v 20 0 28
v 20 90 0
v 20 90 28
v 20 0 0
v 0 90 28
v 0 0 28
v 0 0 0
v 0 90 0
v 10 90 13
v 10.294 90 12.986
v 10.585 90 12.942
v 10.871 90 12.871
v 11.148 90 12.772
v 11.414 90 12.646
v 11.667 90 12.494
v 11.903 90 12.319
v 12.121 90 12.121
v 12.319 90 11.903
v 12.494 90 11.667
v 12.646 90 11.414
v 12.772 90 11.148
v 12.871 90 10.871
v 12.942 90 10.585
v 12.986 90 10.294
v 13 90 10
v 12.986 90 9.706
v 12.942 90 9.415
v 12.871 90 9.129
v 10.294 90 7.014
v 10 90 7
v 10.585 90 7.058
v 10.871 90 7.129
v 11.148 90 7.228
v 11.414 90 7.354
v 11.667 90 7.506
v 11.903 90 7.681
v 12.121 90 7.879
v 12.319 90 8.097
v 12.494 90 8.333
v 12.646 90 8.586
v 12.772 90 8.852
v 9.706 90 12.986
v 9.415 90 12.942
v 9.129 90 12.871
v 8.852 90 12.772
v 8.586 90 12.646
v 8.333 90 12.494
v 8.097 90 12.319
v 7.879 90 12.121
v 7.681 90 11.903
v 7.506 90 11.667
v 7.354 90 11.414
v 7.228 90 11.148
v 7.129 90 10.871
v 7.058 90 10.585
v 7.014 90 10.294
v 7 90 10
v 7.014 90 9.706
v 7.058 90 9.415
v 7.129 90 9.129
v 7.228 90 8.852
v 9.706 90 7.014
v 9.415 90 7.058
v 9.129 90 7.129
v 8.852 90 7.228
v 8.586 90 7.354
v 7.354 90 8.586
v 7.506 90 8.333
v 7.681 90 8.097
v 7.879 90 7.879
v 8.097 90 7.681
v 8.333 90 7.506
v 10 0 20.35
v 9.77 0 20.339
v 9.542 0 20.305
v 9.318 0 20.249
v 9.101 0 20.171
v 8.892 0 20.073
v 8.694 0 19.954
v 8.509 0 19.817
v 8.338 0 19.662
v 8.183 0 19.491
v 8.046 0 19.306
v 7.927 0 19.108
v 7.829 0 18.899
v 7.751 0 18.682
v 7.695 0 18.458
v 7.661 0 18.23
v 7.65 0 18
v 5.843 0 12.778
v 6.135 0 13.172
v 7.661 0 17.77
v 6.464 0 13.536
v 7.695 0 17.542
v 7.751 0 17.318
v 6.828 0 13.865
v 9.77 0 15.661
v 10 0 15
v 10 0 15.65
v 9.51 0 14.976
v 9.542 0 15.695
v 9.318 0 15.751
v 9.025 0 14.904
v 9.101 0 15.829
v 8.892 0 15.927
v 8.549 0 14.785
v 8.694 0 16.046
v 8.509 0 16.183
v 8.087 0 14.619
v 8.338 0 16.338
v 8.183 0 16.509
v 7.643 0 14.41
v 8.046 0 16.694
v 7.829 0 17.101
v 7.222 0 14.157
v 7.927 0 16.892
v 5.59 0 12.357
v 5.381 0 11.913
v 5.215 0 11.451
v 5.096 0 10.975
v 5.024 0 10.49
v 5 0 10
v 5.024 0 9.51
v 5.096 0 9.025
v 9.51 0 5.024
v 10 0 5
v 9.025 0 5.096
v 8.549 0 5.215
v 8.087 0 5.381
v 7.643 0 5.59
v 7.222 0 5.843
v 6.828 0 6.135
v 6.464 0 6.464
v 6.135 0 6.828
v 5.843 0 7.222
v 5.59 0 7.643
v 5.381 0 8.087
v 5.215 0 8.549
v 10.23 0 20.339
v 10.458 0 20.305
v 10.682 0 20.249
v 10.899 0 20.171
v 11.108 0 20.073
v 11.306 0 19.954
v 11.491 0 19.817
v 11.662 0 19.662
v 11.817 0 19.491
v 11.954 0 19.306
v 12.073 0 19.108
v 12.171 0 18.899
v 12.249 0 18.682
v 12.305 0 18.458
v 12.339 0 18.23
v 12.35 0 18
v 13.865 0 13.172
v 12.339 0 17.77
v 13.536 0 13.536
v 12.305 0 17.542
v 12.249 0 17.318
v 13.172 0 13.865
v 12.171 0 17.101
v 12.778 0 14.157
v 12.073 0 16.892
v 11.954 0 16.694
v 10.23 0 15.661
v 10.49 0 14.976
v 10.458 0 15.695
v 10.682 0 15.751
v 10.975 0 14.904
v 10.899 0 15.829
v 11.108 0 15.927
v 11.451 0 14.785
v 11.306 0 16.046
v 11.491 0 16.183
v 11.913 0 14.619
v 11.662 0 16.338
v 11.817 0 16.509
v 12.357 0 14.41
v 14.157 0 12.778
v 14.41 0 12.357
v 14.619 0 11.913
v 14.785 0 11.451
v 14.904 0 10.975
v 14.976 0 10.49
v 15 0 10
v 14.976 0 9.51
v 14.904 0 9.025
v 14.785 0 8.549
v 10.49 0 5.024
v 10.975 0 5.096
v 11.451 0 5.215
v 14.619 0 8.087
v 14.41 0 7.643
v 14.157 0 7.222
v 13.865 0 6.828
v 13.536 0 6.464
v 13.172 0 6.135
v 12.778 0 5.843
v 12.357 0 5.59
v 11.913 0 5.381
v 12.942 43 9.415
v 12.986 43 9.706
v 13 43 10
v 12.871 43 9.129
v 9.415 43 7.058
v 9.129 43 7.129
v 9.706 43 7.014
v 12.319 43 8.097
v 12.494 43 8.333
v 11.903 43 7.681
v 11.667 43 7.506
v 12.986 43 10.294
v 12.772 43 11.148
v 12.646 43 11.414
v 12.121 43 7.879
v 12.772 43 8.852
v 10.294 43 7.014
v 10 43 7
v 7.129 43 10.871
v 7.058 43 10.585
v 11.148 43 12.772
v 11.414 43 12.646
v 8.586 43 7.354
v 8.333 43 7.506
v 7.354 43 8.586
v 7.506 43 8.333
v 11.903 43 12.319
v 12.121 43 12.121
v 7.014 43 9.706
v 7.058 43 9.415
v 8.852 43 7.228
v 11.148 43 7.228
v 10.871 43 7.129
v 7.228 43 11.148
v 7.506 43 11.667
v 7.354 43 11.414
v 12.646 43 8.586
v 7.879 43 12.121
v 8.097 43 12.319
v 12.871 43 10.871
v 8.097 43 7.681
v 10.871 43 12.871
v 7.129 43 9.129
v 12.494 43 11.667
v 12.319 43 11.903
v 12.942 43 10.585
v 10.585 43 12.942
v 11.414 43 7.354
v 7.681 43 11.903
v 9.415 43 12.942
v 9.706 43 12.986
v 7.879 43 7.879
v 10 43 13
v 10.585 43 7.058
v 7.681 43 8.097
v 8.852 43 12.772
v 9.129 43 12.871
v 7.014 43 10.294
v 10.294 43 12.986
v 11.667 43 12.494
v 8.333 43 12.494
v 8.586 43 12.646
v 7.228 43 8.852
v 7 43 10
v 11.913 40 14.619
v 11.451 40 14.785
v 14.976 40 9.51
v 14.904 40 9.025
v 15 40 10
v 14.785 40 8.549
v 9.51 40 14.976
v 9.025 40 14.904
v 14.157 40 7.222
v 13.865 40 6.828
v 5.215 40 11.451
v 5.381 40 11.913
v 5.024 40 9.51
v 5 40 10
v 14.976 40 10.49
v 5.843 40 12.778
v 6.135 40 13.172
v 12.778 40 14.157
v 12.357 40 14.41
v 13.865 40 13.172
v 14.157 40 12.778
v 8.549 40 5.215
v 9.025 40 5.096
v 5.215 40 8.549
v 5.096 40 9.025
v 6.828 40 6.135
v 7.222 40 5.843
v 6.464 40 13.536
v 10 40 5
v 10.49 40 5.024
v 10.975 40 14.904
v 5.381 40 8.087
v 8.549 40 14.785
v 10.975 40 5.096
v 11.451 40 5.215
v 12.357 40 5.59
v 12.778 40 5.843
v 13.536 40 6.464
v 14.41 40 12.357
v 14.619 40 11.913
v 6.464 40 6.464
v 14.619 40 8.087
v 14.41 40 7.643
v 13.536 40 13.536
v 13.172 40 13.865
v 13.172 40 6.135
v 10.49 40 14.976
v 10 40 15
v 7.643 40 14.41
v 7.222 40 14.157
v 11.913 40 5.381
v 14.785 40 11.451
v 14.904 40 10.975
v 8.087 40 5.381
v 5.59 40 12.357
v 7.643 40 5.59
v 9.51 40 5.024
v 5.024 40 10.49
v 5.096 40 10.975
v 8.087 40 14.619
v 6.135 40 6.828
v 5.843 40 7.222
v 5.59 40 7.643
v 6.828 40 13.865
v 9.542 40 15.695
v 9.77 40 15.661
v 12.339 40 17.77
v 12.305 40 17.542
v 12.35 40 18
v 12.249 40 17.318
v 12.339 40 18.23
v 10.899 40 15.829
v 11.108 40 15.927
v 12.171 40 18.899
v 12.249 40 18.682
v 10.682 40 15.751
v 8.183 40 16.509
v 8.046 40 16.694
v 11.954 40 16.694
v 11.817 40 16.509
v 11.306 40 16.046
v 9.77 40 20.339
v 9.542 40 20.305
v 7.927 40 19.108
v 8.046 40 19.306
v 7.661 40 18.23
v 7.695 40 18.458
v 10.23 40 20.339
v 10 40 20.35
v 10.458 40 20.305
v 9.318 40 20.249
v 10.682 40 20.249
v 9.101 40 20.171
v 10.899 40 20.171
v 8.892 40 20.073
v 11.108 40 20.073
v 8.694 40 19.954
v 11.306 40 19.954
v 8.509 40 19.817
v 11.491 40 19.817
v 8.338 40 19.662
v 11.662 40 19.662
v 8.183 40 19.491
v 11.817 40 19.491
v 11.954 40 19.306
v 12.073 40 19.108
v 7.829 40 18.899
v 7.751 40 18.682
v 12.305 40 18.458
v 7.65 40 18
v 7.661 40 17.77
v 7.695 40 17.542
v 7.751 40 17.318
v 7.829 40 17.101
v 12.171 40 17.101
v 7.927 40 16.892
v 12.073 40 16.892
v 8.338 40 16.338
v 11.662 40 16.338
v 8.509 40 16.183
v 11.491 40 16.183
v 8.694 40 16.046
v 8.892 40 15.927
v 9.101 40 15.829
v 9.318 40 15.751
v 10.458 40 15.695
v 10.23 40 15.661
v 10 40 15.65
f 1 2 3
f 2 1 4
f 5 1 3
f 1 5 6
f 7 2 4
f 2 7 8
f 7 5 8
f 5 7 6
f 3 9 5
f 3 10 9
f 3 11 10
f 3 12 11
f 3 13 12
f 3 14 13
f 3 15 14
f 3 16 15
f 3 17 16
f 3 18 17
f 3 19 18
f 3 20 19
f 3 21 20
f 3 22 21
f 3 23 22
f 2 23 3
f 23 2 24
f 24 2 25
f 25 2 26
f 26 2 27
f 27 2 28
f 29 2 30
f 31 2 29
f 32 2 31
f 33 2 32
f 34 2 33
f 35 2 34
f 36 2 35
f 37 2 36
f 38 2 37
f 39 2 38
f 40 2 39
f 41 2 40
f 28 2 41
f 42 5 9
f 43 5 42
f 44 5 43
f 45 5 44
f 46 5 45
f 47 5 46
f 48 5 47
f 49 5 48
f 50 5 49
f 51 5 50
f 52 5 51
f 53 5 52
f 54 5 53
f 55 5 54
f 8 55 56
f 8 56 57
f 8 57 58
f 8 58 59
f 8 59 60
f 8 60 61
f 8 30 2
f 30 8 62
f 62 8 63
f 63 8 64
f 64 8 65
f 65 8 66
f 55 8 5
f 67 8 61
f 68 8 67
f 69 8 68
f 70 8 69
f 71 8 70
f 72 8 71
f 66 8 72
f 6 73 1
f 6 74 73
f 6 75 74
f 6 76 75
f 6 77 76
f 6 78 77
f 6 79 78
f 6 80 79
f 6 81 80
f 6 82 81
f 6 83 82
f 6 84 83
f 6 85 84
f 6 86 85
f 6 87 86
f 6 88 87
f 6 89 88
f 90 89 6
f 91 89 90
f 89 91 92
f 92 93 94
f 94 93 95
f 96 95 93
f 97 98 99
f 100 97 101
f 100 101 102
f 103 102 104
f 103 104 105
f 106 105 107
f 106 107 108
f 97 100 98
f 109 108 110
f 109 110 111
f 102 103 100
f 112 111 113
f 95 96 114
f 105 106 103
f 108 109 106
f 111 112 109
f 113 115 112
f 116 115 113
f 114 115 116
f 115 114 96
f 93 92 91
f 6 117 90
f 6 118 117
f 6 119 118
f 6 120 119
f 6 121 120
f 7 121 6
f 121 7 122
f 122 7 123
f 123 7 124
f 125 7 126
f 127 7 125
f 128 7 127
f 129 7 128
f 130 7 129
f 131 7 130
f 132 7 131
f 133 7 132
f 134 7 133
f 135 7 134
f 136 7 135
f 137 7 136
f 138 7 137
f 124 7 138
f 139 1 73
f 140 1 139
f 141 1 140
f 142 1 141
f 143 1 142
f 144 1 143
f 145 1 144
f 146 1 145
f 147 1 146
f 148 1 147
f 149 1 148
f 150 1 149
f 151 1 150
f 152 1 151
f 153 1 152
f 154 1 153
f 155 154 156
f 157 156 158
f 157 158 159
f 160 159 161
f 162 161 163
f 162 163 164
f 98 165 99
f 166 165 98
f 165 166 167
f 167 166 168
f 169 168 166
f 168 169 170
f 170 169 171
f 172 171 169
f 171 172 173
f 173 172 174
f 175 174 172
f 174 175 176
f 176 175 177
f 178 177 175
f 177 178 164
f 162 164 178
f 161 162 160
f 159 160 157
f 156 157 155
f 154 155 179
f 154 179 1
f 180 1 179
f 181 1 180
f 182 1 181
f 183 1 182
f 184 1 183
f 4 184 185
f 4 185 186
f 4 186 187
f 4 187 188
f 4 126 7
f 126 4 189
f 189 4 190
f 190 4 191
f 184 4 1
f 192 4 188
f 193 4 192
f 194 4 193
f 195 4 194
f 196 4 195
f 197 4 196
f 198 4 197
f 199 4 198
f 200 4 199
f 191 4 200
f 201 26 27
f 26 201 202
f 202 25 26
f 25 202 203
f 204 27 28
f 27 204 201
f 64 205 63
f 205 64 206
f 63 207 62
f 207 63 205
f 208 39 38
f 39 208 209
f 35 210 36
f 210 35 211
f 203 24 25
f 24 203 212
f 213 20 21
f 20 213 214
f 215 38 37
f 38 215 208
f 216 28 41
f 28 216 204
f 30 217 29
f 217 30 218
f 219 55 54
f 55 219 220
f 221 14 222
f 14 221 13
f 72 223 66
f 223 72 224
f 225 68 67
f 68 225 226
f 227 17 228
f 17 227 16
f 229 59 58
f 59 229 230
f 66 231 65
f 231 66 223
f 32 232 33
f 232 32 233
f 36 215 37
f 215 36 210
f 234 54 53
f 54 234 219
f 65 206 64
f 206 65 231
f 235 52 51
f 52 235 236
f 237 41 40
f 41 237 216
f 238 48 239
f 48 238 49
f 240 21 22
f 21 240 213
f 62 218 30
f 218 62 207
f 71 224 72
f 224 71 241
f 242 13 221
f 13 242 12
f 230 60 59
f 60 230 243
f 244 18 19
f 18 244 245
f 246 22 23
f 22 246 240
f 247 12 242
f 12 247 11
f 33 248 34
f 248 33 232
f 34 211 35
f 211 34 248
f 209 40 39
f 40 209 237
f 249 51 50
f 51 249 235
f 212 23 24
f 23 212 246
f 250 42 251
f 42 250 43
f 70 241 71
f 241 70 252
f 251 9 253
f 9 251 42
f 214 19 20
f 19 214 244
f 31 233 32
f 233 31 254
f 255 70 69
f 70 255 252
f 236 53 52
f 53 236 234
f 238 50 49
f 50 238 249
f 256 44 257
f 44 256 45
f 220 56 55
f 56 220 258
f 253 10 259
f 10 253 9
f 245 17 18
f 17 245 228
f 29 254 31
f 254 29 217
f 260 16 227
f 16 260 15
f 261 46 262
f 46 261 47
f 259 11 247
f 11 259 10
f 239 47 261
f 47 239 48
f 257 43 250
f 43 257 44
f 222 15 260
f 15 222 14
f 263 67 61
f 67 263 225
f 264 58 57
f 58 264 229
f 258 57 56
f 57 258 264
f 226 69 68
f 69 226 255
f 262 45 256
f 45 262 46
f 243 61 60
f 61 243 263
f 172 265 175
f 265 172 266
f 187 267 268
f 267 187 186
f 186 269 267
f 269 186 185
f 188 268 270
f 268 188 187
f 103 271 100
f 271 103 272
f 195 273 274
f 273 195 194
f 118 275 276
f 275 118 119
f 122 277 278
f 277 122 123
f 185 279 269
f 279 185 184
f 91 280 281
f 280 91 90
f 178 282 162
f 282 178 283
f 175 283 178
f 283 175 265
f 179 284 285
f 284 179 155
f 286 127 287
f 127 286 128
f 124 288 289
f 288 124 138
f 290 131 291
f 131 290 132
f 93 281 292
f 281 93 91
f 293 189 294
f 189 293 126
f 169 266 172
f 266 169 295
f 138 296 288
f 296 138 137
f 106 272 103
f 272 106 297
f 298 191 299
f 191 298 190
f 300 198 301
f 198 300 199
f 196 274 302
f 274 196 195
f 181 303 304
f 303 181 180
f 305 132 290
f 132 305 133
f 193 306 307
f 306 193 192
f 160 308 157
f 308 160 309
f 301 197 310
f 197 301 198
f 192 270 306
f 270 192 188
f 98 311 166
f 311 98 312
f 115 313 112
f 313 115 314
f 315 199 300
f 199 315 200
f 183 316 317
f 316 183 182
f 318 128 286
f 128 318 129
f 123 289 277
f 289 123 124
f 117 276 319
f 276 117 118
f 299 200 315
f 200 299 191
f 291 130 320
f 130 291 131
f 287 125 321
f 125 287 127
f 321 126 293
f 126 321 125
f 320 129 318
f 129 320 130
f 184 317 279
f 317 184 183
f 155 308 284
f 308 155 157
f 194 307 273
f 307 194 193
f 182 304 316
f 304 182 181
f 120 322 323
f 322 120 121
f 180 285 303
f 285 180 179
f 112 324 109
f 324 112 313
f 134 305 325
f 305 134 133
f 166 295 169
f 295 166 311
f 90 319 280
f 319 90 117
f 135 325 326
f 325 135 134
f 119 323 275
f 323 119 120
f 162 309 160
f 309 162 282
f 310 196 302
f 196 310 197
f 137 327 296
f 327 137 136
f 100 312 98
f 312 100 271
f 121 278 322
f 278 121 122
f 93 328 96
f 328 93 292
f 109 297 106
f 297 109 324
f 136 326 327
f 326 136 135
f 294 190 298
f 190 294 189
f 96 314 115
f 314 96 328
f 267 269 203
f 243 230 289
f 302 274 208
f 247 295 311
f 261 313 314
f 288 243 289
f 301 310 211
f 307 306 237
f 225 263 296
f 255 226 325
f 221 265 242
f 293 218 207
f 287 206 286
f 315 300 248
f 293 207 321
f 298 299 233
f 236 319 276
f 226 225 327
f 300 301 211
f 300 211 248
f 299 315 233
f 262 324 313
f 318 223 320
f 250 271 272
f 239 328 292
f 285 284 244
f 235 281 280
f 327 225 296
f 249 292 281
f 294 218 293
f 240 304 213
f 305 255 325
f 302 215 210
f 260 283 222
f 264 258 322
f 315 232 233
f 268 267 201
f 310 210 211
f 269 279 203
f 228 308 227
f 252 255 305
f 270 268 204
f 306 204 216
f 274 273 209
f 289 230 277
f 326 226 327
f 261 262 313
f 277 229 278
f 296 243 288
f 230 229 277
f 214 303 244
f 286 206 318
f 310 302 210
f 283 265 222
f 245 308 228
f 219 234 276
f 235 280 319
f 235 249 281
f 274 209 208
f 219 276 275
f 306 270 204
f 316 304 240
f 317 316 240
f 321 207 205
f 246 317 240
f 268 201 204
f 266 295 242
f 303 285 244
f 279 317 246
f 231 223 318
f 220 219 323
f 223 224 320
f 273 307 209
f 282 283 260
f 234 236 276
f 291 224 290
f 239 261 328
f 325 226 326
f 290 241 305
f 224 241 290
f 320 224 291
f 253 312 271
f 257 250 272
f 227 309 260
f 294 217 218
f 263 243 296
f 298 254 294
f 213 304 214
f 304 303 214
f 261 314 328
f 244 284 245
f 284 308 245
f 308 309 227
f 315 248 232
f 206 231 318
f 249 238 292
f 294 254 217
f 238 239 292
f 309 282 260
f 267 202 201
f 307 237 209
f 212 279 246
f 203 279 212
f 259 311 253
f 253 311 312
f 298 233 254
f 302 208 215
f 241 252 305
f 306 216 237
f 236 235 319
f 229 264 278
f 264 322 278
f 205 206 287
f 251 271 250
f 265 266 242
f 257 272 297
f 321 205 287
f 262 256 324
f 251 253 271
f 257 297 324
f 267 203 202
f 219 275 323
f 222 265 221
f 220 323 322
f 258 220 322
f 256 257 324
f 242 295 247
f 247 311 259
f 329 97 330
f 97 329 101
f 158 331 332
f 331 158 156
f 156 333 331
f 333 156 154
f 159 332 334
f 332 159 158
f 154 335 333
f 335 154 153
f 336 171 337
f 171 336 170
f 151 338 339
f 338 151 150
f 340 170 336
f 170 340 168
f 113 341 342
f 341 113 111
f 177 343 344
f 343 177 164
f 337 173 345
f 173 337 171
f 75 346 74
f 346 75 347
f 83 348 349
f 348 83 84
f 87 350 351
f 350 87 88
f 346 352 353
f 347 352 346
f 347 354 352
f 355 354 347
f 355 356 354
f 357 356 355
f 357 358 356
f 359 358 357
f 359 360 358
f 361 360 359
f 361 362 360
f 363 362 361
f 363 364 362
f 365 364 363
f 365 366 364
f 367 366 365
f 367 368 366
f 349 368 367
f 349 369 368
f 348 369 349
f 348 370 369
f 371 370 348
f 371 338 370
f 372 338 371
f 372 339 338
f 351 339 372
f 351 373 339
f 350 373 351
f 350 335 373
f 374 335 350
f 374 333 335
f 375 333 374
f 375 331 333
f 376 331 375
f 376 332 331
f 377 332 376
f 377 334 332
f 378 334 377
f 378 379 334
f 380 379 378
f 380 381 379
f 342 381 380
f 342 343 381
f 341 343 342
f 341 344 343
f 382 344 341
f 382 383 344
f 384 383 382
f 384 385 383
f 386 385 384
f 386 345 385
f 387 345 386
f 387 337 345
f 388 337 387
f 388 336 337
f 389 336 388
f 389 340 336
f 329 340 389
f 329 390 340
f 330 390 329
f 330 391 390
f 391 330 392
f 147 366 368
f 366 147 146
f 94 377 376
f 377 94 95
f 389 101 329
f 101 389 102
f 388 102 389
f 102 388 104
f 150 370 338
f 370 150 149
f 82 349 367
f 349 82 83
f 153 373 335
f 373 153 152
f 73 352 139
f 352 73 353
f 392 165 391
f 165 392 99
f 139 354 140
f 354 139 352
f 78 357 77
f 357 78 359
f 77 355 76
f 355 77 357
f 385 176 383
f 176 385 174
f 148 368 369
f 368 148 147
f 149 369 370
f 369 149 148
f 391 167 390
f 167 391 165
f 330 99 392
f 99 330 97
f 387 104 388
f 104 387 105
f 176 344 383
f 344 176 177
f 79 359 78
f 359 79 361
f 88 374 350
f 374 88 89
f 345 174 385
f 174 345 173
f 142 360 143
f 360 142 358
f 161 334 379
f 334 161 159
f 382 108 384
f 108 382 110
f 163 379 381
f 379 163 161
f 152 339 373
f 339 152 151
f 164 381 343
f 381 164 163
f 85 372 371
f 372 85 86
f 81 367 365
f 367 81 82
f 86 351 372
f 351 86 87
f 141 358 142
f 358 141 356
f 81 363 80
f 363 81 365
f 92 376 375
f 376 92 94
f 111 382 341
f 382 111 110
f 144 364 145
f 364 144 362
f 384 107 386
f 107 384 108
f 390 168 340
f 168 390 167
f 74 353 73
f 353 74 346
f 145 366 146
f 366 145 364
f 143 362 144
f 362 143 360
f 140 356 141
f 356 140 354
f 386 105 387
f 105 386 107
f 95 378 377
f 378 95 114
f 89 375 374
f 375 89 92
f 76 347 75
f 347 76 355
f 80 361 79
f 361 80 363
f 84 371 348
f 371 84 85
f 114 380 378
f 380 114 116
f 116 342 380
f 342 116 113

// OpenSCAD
$fn = 64;
render() {
  difference() {
    cube([20, 90, 28]);

    // Wall screw hole
    translate([10, -1, 10])
      rotate([-90, 0, 0])
        cylinder(h=92, d=6);
    // Wall screw hole - wide part
    translate([10, -1, 10])
      rotate([-90, 0, 0])
        cylinder(h=41, d=10);
    // Countersink for wall screw
    translate([10, 40, 10])
      rotate([-90, 0, 0])
        cylinder(h=3, d1=10, d2=6);

    // M5 screw hole
    translate([10, -1, 18])
      rotate([-90, 0, 0])
        cylinder(h=41, d=4.7);
  }
}
